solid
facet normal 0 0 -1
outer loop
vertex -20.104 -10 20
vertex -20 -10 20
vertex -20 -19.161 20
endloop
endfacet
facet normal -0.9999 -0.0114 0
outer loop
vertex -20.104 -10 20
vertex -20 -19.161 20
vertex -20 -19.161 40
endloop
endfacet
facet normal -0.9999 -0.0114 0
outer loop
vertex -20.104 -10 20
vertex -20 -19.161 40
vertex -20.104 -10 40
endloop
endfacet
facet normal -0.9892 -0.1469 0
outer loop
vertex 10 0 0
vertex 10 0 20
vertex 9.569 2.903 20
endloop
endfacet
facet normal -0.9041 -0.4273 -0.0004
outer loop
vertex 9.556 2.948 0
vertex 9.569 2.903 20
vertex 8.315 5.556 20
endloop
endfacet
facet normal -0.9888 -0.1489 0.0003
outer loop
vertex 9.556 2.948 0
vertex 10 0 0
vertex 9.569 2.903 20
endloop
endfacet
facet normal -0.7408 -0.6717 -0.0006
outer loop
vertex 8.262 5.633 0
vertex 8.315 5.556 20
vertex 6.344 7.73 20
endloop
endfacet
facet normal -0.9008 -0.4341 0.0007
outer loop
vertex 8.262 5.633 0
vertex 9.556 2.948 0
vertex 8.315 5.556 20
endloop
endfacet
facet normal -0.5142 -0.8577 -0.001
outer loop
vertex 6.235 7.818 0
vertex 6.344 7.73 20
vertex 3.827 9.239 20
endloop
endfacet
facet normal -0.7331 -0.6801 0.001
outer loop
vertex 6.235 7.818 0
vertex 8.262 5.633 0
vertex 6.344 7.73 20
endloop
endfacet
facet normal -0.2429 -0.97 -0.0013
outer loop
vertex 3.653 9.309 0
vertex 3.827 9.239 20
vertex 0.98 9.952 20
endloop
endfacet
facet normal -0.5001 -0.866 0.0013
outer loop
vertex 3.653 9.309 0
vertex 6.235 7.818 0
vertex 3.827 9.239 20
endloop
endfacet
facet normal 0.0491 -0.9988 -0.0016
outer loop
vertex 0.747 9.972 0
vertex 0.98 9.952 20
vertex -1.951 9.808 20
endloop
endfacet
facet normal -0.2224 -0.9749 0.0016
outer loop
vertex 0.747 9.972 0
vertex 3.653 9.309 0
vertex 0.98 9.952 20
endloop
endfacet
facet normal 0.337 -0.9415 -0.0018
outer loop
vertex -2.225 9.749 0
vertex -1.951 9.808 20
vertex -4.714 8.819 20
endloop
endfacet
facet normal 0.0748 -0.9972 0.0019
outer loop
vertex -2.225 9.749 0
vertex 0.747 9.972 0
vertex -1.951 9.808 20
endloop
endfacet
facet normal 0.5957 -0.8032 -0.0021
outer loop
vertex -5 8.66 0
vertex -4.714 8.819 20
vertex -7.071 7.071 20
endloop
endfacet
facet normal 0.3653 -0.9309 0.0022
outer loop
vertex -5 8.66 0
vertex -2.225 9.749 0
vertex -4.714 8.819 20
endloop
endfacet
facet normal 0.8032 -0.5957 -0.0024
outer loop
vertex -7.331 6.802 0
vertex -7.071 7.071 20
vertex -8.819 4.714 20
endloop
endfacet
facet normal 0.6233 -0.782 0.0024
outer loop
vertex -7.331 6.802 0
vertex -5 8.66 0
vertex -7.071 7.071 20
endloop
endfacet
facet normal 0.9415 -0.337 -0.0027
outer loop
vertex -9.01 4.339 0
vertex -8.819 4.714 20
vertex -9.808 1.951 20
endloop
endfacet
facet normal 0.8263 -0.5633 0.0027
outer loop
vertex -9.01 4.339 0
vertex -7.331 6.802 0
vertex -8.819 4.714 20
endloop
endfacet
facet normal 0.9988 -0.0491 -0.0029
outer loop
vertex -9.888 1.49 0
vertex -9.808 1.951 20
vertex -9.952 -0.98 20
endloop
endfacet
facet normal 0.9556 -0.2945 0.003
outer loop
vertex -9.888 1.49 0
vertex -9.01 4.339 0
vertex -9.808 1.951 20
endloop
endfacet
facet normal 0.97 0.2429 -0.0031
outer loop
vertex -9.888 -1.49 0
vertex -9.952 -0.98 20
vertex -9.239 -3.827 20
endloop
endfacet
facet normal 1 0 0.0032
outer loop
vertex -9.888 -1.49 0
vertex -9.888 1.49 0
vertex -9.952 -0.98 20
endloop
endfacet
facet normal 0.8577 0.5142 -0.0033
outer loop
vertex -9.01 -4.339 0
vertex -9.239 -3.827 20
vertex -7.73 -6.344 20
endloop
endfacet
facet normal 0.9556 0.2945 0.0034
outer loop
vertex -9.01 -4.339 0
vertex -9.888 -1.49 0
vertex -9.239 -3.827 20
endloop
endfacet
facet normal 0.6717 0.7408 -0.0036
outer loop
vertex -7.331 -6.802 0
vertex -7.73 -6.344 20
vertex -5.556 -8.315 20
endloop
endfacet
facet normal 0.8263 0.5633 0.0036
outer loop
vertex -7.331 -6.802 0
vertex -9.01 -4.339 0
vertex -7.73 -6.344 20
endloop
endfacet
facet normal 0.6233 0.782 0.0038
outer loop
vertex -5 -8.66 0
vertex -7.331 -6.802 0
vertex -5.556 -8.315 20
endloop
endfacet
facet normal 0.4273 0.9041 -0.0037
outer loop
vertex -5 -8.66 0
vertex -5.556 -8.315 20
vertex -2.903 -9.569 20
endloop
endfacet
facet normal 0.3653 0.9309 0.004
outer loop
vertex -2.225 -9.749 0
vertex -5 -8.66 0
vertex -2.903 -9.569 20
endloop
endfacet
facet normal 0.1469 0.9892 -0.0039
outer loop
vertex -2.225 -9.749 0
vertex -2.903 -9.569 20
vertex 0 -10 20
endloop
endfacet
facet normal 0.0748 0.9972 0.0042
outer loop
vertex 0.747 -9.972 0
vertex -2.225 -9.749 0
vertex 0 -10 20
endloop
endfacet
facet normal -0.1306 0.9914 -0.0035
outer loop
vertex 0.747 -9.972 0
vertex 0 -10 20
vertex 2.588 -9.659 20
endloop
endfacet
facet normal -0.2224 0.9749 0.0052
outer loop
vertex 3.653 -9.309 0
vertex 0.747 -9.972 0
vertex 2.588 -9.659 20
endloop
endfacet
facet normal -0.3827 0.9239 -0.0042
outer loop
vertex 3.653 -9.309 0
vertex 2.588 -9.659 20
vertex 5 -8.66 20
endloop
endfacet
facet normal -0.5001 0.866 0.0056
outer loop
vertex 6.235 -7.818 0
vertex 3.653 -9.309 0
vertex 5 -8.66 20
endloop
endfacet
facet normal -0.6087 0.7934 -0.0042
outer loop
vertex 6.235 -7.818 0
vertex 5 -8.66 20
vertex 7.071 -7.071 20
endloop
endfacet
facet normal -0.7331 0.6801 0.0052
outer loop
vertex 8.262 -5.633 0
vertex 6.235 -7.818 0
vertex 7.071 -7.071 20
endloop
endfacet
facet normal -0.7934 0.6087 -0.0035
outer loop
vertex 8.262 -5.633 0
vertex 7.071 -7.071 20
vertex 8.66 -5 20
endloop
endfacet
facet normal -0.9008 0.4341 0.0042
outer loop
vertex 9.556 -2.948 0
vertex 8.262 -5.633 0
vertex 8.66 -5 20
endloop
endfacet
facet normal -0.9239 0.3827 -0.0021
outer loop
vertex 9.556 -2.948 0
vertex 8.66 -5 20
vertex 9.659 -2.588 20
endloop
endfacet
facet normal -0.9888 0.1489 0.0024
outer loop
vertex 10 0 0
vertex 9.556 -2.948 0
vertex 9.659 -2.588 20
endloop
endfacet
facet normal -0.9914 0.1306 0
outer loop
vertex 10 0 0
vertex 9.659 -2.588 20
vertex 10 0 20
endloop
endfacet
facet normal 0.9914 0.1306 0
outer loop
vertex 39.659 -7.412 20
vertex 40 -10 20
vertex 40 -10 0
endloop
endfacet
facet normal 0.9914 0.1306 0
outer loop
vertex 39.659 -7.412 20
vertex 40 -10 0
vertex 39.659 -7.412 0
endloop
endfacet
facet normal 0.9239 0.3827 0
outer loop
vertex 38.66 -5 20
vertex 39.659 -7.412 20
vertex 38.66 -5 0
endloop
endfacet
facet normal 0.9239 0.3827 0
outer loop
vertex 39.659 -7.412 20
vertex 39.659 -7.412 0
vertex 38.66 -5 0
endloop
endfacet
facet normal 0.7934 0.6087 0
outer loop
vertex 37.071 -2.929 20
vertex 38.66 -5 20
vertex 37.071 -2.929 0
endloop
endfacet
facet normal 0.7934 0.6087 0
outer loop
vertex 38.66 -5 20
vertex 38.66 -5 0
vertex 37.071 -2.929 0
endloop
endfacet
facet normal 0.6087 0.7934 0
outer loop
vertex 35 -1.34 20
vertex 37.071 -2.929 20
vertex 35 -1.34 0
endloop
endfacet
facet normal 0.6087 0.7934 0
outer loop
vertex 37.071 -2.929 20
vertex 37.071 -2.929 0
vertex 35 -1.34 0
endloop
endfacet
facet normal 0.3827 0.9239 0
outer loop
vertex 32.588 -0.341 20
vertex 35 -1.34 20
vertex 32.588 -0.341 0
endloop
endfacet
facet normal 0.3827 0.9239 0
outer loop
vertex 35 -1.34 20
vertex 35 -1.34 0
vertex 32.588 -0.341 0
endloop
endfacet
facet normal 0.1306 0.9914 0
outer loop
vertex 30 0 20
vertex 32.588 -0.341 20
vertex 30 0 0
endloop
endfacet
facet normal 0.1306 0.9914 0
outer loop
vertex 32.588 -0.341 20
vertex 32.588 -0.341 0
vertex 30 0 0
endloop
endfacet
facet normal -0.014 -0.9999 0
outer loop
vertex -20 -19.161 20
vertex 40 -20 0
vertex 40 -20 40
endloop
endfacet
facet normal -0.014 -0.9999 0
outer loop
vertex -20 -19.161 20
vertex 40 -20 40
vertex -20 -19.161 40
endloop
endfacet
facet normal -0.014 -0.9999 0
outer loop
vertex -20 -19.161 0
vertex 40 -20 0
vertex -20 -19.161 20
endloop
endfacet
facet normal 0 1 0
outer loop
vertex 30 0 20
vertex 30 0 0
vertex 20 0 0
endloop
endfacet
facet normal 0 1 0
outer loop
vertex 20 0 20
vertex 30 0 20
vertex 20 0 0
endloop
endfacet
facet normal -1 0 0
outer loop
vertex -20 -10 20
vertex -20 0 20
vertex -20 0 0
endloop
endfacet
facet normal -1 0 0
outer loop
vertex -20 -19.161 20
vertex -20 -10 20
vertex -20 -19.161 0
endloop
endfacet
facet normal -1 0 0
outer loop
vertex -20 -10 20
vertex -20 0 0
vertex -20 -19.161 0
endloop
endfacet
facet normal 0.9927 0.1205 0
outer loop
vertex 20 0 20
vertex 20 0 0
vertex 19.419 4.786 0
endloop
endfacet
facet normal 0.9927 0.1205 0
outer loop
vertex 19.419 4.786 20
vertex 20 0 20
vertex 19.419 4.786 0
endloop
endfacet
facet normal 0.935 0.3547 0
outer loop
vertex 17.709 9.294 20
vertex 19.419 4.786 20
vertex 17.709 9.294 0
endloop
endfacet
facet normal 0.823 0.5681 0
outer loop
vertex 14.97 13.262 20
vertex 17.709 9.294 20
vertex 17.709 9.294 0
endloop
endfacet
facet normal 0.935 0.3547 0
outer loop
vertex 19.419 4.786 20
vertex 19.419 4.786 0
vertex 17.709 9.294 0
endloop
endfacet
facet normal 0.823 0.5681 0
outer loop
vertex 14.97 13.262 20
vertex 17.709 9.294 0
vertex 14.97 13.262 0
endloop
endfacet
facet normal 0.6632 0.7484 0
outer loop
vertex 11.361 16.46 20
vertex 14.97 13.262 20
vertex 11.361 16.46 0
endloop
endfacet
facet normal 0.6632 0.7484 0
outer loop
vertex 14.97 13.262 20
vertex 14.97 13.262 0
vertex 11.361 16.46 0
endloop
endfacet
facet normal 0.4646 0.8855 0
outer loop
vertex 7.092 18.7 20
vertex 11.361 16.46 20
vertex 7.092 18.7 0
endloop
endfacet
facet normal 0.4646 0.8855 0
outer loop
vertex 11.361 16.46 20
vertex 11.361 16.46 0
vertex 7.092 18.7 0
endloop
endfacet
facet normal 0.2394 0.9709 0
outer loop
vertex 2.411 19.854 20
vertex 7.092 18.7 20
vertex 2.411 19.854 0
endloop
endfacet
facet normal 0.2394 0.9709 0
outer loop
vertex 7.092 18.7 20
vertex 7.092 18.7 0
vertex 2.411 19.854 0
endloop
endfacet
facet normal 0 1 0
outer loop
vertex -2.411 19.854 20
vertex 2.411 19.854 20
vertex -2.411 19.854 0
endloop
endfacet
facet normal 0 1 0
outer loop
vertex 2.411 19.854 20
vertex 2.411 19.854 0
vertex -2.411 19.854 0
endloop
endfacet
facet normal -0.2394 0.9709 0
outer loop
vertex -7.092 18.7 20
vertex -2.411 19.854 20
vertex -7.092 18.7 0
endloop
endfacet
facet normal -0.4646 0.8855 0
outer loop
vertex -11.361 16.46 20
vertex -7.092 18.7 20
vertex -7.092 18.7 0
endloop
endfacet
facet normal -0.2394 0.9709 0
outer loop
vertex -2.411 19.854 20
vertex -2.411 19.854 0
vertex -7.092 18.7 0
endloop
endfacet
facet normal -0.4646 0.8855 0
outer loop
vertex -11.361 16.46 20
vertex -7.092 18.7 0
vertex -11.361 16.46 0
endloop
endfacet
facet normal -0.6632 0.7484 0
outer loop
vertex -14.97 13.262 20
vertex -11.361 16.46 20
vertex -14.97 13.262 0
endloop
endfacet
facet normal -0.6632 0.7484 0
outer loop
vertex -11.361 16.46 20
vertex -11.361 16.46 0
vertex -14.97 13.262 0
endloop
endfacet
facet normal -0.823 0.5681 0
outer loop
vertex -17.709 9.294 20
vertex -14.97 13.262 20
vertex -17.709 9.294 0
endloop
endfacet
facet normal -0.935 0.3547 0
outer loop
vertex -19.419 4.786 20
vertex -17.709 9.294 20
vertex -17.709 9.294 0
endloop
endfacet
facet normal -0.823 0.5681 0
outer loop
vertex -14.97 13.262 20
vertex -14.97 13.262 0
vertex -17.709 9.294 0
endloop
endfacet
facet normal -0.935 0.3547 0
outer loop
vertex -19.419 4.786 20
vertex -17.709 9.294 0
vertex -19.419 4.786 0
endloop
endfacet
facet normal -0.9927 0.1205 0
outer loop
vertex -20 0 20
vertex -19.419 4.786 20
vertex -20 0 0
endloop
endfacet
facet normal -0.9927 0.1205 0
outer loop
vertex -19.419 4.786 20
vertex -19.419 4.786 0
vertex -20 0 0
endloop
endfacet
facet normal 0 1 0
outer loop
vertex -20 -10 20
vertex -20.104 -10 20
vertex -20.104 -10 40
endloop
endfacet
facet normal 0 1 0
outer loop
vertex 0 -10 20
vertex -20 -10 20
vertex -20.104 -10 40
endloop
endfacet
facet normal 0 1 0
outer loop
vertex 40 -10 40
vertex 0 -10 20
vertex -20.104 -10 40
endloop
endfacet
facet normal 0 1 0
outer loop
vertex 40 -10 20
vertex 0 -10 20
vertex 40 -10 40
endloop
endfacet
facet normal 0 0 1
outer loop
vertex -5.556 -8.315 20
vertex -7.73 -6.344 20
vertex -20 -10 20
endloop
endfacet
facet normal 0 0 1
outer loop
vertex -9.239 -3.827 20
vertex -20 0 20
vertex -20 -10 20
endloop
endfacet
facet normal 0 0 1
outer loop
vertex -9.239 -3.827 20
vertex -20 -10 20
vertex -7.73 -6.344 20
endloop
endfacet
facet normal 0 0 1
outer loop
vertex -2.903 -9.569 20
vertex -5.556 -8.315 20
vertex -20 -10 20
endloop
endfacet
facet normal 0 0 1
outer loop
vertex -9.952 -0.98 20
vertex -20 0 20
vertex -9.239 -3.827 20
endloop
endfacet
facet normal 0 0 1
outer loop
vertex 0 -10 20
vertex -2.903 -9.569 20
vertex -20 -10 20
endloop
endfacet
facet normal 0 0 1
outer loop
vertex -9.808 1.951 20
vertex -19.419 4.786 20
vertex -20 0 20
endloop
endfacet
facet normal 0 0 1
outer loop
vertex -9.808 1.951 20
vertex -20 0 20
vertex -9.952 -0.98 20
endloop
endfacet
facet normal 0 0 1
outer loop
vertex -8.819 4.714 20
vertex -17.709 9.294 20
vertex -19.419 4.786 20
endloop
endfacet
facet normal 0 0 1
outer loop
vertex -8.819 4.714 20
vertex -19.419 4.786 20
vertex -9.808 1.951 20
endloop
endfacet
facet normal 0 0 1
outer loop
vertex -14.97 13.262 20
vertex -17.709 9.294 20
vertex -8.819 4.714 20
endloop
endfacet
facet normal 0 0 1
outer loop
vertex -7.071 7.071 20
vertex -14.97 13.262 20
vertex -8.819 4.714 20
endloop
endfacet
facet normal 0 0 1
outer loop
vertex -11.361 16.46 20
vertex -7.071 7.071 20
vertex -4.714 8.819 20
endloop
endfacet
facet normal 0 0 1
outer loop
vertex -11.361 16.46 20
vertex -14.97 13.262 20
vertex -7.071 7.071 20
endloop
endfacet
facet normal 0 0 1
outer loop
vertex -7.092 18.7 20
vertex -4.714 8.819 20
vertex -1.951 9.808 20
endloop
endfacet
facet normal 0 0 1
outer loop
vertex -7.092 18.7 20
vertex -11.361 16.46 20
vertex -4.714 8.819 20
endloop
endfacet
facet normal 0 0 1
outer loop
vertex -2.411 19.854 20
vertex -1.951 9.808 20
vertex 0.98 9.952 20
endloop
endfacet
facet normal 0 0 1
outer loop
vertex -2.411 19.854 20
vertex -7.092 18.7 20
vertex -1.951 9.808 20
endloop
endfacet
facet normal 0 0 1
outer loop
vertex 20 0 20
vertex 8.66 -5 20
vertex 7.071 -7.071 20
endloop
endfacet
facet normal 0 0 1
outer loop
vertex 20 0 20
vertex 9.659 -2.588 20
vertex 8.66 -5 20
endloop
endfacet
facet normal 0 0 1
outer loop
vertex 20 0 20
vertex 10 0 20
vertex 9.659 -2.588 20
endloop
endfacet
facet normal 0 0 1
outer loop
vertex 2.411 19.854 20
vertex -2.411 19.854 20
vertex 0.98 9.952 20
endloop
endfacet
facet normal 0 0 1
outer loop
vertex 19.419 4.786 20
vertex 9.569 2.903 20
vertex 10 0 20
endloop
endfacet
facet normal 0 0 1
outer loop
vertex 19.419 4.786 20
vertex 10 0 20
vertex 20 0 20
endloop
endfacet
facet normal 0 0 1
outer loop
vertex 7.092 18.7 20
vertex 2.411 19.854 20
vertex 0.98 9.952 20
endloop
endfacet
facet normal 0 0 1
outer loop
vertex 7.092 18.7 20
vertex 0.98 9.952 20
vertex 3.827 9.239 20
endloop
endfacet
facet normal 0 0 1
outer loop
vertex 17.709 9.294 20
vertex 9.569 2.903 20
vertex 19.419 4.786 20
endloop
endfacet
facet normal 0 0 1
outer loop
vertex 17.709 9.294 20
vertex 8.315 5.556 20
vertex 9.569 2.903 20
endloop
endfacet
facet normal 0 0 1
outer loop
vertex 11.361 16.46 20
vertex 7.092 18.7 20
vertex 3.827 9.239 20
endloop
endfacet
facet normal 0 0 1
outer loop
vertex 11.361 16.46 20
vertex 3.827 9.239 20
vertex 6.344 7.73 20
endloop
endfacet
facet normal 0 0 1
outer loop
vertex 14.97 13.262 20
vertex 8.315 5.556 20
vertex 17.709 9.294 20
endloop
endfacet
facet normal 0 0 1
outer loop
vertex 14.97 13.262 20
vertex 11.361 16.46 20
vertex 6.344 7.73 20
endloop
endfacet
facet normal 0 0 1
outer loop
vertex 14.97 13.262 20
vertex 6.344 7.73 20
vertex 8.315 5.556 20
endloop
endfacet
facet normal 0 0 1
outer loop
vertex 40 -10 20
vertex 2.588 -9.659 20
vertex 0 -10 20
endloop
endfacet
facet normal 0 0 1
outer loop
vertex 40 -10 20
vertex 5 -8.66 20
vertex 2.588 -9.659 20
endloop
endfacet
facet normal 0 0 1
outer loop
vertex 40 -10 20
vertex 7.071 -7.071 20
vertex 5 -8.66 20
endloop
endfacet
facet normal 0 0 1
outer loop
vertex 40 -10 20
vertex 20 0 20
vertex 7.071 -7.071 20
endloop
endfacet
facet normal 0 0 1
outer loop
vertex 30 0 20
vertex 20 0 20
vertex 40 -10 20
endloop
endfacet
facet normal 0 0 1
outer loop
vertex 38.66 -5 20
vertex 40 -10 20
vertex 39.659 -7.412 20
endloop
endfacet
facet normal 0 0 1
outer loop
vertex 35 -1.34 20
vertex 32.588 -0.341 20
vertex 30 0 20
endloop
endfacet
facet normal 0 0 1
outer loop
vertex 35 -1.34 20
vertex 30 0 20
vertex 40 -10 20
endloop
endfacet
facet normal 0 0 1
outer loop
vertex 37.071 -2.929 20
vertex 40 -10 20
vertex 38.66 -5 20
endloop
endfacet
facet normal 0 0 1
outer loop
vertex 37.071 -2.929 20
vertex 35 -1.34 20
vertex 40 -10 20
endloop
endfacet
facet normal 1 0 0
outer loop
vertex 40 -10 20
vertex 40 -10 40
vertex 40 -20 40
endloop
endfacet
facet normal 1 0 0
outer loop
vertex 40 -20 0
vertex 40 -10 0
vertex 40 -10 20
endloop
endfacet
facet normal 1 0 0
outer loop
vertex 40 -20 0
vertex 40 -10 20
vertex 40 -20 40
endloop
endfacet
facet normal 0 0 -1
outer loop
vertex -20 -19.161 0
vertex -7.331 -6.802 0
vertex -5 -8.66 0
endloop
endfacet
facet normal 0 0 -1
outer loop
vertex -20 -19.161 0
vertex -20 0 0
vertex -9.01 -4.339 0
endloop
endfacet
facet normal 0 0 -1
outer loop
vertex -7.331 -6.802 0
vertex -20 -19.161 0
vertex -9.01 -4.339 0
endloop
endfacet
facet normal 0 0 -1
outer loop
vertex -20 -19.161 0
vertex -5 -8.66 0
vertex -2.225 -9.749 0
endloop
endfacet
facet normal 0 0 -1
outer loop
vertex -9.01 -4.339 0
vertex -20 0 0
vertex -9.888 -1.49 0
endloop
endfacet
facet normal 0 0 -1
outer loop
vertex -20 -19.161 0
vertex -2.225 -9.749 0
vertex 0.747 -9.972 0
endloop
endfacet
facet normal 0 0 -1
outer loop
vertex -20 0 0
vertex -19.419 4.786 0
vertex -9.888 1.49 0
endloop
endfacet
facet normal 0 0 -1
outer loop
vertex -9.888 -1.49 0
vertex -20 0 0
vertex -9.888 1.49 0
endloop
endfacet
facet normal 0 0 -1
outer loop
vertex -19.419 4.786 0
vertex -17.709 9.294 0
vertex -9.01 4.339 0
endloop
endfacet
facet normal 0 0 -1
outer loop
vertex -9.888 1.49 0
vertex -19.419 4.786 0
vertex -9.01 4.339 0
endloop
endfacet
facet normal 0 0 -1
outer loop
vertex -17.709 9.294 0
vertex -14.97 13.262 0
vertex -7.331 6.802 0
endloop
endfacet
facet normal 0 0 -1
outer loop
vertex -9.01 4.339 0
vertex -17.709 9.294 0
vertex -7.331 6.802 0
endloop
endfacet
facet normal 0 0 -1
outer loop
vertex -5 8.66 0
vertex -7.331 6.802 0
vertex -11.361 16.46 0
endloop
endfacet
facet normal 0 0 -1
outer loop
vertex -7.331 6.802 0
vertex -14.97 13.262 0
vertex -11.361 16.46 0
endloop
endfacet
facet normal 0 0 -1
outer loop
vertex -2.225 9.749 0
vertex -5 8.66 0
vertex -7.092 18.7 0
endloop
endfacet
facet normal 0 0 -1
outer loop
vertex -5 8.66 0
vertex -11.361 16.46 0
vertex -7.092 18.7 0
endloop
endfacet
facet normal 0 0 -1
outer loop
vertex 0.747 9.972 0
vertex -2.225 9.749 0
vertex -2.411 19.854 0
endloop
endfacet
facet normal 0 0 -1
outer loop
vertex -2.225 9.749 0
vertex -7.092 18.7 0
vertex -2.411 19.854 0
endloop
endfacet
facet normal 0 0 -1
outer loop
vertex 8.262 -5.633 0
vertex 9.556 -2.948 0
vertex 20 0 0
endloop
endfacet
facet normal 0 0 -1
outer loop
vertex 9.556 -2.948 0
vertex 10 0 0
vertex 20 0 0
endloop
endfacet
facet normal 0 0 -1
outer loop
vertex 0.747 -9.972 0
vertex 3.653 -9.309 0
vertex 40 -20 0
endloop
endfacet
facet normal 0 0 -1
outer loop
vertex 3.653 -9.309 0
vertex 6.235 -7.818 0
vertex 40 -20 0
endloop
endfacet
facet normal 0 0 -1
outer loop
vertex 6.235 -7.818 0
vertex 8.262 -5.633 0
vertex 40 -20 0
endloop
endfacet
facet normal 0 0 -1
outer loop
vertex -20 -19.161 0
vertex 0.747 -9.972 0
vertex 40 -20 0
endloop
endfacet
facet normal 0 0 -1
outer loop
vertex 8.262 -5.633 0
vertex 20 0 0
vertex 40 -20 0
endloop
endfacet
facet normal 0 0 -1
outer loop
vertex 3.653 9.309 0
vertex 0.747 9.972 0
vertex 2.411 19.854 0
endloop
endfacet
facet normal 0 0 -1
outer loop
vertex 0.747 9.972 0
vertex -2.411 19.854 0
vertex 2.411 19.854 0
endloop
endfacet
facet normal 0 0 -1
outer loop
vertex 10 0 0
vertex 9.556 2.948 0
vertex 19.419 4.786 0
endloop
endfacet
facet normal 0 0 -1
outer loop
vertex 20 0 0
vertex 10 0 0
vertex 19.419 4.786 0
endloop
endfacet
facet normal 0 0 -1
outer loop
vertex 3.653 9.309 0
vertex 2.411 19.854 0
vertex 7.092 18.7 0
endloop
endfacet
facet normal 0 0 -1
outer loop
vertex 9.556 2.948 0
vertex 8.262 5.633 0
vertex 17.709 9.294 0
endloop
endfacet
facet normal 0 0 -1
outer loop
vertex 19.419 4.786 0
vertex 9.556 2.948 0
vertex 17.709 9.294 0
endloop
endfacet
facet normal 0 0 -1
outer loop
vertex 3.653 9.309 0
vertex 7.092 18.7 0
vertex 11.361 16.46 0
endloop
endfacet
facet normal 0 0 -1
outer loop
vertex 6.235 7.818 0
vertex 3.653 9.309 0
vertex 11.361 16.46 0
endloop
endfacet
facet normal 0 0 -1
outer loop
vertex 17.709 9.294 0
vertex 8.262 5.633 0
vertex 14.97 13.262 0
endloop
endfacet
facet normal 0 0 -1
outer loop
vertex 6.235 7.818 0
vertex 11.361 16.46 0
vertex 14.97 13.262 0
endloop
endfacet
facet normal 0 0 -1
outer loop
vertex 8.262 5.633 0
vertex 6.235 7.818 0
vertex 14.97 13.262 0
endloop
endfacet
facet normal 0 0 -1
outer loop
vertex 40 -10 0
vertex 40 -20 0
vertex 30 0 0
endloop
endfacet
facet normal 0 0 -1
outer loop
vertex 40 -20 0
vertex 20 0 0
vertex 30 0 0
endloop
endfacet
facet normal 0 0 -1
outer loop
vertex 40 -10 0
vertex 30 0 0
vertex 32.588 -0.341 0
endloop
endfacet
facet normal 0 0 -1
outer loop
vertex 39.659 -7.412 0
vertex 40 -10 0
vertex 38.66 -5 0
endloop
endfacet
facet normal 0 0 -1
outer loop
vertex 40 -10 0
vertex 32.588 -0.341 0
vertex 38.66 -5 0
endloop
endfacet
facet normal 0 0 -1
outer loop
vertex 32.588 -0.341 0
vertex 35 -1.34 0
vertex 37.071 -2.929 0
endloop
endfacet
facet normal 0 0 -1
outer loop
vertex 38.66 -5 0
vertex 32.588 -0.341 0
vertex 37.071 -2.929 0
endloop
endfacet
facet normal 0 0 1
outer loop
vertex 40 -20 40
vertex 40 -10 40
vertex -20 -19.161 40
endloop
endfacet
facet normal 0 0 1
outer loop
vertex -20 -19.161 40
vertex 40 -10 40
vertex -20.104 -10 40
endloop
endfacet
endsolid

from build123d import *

# Parameters (mm, degrees)
SKETCH1_R           = 10
BOSS_EXTRUDE1_DEPTH = 20
BOSS_EXTRUDE2_DEPTH = 20


with BuildPart() as part:
    # Sketch1 → Boss-Extrude1 (new body)
    with BuildSketch(Plane.XY):
        with BuildLine():
            Line((-20, 0), (-20, -10))
            Line((-20, -10), (-20, -19.161425494))
            Line((-20, -19.161425494), (40, -20))
            Line((40, -20), (40, -10))
            ThreePointArc((40, -10), (37.071067812, -2.928932188), (30, 0))
            Line((30, 0), (20, 0))
            ThreePointArc((20, 0), (0, 20), (-20, 0))
        make_face()
        Circle(SKETCH1_R, mode=Mode.SUBTRACT)
    extrude(amount=BOSS_EXTRUDE1_DEPTH)

    # Sketch3 → Boss-Extrude2 (add)
    with BuildSketch(Plane.XY.offset(20)):
        Polygon((-20.104236771, -10), (40, -10), (40, -20), (-20, -19.161425494), align=None)
    extrude(amount=BOSS_EXTRUDE2_DEPTH)


solid = part.part
